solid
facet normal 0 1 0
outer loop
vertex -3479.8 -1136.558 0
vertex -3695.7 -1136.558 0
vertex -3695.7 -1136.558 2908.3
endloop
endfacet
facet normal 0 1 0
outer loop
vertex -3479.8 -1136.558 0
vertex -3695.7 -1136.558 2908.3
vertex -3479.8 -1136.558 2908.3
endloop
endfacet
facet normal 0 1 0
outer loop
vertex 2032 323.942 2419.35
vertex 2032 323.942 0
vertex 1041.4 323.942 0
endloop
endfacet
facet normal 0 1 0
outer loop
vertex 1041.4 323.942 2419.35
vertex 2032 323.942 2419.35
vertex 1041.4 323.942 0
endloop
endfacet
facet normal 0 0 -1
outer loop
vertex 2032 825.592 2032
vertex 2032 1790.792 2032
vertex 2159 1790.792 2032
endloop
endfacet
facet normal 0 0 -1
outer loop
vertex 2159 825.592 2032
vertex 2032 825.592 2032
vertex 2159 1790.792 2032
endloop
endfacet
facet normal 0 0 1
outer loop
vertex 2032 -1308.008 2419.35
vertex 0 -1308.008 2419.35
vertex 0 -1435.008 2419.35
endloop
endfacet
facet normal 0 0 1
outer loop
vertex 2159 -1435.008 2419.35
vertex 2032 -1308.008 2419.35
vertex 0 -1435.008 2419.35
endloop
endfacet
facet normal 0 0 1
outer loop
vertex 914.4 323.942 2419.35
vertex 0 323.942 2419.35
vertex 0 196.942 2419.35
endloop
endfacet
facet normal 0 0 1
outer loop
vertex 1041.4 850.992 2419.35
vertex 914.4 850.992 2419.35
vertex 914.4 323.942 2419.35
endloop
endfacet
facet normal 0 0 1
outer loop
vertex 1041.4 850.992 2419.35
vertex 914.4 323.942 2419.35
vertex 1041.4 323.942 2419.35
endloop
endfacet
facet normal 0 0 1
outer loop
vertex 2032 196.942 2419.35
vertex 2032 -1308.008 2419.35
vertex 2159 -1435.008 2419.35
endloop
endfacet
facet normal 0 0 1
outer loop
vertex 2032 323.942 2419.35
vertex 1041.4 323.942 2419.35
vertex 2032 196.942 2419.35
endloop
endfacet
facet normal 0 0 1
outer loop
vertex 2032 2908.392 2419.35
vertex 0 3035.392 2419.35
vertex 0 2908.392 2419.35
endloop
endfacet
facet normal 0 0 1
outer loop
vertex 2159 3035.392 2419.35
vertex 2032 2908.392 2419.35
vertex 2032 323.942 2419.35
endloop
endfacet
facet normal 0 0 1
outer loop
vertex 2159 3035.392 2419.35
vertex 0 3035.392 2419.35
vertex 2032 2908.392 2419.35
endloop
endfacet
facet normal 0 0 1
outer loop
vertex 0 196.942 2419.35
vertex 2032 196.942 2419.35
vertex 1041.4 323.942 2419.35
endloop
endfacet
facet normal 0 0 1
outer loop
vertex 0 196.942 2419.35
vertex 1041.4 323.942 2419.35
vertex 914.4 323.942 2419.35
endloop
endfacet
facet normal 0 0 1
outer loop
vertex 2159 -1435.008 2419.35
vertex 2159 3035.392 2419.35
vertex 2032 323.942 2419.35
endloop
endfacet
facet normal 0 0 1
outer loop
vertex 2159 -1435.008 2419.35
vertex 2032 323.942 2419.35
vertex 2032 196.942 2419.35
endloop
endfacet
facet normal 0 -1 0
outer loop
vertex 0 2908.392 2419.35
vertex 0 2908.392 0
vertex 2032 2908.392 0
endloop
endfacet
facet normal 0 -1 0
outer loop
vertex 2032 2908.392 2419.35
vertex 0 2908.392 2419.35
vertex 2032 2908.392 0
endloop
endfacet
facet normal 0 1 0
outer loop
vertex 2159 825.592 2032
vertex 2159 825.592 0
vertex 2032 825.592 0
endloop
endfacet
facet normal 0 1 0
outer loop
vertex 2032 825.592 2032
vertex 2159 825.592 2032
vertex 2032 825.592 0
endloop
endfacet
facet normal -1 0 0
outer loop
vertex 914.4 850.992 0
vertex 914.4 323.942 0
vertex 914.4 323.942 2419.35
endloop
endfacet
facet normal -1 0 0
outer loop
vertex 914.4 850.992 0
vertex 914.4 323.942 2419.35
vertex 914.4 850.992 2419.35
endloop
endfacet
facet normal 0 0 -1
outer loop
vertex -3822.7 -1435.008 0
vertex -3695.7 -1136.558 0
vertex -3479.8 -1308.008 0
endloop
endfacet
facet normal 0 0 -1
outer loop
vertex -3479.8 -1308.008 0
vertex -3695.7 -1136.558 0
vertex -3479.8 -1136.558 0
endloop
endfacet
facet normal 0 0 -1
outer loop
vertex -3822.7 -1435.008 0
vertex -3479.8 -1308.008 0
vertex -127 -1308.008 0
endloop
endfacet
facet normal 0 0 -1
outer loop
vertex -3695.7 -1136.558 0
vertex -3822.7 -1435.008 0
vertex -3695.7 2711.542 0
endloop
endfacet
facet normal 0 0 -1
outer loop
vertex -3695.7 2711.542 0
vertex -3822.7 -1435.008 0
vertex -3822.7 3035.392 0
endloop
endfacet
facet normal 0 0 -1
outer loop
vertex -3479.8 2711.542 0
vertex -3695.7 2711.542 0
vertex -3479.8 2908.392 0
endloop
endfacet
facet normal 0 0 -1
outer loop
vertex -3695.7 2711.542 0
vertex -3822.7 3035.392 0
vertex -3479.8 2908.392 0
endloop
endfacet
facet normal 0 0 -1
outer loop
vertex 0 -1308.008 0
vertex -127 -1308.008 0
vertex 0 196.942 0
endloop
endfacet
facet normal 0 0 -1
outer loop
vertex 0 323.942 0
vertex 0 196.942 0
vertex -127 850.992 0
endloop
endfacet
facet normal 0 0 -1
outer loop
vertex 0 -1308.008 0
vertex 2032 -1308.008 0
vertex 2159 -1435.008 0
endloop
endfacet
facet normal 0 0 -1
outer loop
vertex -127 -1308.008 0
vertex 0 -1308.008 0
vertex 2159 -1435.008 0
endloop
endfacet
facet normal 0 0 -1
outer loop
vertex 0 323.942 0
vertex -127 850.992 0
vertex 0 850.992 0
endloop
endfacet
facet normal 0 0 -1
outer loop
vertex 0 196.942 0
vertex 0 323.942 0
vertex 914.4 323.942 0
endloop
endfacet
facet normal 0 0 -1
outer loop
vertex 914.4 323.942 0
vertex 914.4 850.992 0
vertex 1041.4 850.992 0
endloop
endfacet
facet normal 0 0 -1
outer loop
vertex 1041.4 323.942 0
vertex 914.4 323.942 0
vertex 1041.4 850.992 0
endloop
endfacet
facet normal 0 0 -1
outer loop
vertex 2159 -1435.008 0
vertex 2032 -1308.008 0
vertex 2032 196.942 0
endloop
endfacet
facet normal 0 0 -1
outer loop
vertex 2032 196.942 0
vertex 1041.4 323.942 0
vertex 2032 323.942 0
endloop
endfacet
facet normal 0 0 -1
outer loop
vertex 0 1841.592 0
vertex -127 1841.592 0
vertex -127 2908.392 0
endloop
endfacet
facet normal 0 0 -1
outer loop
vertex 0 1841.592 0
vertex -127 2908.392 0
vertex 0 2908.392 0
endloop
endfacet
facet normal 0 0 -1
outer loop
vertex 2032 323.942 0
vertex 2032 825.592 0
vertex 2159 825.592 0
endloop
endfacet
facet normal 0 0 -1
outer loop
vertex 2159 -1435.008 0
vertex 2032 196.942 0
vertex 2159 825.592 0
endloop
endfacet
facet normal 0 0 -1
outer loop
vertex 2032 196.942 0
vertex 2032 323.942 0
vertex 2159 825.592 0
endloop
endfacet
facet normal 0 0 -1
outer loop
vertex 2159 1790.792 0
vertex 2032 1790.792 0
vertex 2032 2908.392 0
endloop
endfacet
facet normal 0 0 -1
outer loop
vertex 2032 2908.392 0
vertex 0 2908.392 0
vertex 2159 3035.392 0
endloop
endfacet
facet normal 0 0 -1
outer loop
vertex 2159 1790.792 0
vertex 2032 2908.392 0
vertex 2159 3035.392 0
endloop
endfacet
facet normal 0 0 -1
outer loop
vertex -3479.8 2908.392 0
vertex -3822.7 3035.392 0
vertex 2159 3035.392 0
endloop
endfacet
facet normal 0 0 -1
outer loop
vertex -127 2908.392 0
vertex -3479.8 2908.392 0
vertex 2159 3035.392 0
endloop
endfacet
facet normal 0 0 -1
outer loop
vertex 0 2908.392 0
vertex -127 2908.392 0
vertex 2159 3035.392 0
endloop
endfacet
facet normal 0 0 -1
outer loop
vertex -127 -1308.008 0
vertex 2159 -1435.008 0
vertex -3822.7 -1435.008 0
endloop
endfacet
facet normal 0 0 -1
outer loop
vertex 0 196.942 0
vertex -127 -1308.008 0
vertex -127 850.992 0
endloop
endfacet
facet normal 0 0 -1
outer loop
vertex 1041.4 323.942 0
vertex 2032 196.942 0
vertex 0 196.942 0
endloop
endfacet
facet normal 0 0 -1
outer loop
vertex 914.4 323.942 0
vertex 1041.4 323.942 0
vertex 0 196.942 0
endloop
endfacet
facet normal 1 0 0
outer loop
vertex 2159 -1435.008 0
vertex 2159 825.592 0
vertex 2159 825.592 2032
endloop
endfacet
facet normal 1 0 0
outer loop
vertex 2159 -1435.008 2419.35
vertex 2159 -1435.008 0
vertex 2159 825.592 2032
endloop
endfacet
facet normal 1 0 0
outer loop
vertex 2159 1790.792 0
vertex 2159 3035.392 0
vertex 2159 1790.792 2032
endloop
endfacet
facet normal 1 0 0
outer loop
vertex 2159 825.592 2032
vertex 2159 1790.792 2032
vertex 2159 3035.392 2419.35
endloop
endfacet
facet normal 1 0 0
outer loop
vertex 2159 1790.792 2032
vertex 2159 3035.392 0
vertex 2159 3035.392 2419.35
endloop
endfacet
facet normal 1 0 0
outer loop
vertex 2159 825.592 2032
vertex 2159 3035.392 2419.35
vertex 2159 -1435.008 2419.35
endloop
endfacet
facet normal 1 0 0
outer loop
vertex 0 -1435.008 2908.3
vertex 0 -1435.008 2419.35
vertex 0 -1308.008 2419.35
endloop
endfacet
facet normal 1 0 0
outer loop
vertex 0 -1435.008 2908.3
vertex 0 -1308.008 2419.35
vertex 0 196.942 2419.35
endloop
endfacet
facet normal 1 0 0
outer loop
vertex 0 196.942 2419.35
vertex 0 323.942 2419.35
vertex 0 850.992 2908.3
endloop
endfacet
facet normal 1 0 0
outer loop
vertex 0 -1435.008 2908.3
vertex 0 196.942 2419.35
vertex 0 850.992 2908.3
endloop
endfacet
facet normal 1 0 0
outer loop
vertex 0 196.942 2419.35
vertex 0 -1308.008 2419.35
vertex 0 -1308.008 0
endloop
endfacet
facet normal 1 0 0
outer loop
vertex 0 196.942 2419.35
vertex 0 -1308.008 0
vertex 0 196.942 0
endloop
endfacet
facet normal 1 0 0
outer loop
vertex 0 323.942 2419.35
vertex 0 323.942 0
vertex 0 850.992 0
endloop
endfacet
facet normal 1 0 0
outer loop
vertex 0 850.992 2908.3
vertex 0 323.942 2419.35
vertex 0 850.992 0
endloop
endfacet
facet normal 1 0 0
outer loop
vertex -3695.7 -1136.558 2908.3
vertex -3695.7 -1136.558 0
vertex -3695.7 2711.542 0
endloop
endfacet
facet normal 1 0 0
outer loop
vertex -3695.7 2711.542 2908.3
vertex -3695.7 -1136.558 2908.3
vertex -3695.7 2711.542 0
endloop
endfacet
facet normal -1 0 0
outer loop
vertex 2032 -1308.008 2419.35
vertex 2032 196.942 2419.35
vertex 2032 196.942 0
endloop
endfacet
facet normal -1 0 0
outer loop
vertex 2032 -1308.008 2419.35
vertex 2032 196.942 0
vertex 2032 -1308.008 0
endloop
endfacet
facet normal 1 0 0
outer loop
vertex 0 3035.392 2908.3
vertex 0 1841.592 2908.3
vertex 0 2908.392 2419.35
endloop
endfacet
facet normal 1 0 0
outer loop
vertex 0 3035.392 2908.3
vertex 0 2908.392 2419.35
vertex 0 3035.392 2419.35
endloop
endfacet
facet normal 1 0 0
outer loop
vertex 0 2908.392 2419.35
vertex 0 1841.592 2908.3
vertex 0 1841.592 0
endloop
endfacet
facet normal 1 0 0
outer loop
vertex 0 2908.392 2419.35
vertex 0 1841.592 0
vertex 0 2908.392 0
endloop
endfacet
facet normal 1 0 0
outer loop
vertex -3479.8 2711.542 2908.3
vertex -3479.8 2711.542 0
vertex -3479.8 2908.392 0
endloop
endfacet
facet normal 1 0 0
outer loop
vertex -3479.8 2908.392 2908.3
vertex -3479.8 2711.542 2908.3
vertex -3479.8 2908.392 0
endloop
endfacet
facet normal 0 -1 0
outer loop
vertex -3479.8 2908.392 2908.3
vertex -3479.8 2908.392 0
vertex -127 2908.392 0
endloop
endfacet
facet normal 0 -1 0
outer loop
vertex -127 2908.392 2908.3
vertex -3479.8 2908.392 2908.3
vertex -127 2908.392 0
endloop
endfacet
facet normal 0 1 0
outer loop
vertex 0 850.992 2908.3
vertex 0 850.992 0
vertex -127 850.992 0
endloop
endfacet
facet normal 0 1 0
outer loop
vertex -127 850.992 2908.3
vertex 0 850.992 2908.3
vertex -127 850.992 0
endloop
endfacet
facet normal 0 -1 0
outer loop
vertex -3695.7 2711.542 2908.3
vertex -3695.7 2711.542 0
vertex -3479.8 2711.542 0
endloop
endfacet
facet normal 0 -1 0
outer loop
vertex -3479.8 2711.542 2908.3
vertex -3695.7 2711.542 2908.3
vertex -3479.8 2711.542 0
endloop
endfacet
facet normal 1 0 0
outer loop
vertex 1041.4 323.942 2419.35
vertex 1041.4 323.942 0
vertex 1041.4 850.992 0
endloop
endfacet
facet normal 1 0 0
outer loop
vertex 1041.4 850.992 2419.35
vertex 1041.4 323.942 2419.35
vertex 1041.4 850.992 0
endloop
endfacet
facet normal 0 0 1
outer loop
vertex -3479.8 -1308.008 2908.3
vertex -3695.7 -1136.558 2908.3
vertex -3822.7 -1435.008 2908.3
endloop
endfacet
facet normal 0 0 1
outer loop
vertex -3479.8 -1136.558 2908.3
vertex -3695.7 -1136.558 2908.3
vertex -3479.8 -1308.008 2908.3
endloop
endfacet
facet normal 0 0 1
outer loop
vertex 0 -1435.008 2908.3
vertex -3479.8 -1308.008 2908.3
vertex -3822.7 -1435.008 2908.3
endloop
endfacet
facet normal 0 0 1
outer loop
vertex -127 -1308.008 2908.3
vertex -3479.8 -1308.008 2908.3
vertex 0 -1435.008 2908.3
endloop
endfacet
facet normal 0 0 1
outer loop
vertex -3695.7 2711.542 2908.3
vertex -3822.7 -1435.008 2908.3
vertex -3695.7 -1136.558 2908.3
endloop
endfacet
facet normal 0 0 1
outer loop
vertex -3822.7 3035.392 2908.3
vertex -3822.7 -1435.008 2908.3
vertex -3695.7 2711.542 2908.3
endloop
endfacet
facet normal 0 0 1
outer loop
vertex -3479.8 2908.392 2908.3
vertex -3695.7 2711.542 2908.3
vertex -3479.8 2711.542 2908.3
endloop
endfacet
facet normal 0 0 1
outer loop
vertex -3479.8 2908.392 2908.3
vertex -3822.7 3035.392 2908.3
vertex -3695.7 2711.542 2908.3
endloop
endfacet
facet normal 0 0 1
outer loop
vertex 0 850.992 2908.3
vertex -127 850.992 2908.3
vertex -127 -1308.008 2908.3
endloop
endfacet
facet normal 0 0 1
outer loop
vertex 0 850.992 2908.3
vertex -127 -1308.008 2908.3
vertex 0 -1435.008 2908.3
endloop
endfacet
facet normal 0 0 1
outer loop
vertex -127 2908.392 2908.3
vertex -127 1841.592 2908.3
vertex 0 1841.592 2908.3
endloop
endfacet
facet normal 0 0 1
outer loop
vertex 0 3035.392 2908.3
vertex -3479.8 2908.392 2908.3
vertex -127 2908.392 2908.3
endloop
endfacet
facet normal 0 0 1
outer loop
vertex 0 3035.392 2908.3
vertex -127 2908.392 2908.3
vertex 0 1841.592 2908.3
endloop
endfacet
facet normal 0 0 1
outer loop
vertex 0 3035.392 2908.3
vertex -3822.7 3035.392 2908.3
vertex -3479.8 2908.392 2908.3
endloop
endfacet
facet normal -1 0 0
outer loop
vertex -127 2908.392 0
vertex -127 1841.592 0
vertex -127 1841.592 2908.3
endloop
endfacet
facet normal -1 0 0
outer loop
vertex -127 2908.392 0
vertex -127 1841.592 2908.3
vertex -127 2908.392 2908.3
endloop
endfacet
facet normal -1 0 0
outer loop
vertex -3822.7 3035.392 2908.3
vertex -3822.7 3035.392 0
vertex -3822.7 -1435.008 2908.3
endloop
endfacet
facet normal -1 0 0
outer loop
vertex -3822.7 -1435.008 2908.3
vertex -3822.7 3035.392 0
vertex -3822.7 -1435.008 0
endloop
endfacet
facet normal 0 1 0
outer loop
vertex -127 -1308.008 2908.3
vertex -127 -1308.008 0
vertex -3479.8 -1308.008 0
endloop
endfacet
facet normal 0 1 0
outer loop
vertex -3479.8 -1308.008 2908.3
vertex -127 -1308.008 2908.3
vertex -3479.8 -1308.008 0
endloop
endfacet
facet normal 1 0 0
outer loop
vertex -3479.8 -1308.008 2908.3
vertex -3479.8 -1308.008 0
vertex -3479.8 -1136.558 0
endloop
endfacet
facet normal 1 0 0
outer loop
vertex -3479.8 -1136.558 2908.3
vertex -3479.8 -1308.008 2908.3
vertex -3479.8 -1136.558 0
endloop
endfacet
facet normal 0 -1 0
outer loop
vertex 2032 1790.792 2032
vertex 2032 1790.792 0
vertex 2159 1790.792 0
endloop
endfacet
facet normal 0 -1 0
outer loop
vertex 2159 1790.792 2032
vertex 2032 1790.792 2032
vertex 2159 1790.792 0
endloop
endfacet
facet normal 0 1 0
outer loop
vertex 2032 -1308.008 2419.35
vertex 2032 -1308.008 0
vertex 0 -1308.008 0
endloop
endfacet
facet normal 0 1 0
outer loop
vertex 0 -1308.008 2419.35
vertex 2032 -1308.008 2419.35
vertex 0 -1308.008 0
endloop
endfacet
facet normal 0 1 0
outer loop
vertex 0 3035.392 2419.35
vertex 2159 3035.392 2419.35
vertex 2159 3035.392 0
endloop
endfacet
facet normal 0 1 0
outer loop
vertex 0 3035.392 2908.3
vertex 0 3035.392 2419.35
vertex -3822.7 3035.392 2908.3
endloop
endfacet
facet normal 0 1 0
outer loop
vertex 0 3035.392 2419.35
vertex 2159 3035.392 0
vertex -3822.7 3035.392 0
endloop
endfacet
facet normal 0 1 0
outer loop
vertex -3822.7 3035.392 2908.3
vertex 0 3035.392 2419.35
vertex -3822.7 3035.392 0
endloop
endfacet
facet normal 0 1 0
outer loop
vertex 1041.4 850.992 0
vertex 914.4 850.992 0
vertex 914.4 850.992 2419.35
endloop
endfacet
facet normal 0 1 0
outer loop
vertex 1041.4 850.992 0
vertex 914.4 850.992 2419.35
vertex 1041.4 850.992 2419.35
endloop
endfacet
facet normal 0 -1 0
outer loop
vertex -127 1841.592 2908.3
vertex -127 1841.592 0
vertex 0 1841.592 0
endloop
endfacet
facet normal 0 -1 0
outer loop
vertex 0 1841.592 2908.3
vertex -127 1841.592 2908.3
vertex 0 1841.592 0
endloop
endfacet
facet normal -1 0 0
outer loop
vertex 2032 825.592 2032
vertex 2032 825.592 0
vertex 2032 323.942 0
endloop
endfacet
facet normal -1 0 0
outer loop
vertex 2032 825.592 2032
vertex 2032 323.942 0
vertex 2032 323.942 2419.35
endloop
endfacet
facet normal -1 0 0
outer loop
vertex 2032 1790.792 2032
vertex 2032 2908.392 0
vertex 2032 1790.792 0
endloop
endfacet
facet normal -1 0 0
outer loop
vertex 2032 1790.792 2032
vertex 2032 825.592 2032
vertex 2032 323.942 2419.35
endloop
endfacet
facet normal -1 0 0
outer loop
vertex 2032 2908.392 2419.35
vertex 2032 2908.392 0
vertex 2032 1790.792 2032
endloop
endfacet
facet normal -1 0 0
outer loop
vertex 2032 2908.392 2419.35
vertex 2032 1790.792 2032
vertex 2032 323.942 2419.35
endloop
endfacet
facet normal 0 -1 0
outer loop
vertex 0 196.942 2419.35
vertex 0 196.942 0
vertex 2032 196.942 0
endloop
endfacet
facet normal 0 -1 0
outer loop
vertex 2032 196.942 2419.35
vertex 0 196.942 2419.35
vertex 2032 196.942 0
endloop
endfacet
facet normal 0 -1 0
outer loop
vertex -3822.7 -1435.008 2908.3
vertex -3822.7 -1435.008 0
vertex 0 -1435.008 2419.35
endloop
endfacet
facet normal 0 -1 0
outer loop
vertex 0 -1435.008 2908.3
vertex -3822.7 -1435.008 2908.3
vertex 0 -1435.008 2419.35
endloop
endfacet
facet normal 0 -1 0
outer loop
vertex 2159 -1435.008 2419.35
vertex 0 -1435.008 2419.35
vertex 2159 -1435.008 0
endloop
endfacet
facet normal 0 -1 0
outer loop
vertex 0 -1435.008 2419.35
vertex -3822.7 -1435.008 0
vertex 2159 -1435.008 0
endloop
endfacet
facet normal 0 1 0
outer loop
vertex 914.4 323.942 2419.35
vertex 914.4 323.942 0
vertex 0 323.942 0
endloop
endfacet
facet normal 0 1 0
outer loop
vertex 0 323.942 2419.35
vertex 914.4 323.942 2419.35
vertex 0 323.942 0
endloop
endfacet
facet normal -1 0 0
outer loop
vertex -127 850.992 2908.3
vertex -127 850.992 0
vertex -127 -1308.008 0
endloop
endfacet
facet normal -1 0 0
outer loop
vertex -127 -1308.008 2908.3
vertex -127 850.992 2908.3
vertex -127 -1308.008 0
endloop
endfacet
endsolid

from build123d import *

# Parameters (mm, degrees)
F0_W     = 127
F0_H     = 1066.8
F0_W_2   = 215.9
F0_H_2   = 171.45
F0_H_3   = 196.85
F1_DEPTH = 2908.3
F0_H_4   = 527.05
F2_DEPTH = 2419.35
F3_W     = 127
F3_H     = 387.35
F4_DEPTH = 965.2


with BuildPart() as f1:
    # F0 (on Top) → F1 (new body)
    with BuildSketch(Plane.XY):
        Polygon((-3695.7, 2711.541673), (-3695.7, 2908.391673), (-3479.8, 2908.391673), (-127, 2908.391673), (0, 2908.391673), (0, 3035.391673), (-3822.7, 3035.391673), (-3822.7, -1435.008327), (0, -1435.008327), (0, -1308.008327), (-127, -1308.008327), (-3479.8, -1308.008327), (-3695.7, -1308.008327), (-3695.7, -1136.558327), align=None)
        Polygon((0, 850.991673), (-127, 850.991673), (-127, -1308.008327), (0, -1308.008327), (0, 196.941673), (0, 323.941673), align=None)
        with Locations((-63.5, 2374.991673)):
            Rectangle(F0_W, F0_H)
        with Locations((-3587.75, -1222.283327)):
            Rectangle(F0_W_2, F0_H_2)
        with Locations((-3587.75, 2809.966673)):
            Rectangle(F0_W_2, F0_H_3)
    extrude(amount=F1_DEPTH)

    # F0 (on Top) → F2 (join)
    with BuildSketch(Plane.XY):
        Polygon((0, 3035.391673), (0, 2908.391673), (2032, 2908.391673), (2032, 1790.791673), (2159, 1790.791673), (2159, 3035.391673), align=None)
        with Locations((977.9, 587.466673)):
            Rectangle(F0_W, F0_H_4)
        Polygon((914.4, 323.941673), (0, 323.941673), (0, 196.941673), (2032, 196.941673), (2032, 323.941673), (1041.4, 323.941673), align=None)
        Polygon((2032, -1308.008327), (0, -1308.008327), (0, -1435.008327), (2159, -1435.008327), (2159, 825.591673), (2032, 825.591673), (2032, 323.941673), (2032, 196.941673), align=None)
    extrude(amount=F2_DEPTH)

    # F3 (on face) → F4 (join)
    with BuildSketch(Plane.XZ.offset(-1790.791673)):
        with Locations((2095.5, 2225.675)):
            Rectangle(F3_W, F3_H)
    extrude(amount=F4_DEPTH)


solid = f1.part
